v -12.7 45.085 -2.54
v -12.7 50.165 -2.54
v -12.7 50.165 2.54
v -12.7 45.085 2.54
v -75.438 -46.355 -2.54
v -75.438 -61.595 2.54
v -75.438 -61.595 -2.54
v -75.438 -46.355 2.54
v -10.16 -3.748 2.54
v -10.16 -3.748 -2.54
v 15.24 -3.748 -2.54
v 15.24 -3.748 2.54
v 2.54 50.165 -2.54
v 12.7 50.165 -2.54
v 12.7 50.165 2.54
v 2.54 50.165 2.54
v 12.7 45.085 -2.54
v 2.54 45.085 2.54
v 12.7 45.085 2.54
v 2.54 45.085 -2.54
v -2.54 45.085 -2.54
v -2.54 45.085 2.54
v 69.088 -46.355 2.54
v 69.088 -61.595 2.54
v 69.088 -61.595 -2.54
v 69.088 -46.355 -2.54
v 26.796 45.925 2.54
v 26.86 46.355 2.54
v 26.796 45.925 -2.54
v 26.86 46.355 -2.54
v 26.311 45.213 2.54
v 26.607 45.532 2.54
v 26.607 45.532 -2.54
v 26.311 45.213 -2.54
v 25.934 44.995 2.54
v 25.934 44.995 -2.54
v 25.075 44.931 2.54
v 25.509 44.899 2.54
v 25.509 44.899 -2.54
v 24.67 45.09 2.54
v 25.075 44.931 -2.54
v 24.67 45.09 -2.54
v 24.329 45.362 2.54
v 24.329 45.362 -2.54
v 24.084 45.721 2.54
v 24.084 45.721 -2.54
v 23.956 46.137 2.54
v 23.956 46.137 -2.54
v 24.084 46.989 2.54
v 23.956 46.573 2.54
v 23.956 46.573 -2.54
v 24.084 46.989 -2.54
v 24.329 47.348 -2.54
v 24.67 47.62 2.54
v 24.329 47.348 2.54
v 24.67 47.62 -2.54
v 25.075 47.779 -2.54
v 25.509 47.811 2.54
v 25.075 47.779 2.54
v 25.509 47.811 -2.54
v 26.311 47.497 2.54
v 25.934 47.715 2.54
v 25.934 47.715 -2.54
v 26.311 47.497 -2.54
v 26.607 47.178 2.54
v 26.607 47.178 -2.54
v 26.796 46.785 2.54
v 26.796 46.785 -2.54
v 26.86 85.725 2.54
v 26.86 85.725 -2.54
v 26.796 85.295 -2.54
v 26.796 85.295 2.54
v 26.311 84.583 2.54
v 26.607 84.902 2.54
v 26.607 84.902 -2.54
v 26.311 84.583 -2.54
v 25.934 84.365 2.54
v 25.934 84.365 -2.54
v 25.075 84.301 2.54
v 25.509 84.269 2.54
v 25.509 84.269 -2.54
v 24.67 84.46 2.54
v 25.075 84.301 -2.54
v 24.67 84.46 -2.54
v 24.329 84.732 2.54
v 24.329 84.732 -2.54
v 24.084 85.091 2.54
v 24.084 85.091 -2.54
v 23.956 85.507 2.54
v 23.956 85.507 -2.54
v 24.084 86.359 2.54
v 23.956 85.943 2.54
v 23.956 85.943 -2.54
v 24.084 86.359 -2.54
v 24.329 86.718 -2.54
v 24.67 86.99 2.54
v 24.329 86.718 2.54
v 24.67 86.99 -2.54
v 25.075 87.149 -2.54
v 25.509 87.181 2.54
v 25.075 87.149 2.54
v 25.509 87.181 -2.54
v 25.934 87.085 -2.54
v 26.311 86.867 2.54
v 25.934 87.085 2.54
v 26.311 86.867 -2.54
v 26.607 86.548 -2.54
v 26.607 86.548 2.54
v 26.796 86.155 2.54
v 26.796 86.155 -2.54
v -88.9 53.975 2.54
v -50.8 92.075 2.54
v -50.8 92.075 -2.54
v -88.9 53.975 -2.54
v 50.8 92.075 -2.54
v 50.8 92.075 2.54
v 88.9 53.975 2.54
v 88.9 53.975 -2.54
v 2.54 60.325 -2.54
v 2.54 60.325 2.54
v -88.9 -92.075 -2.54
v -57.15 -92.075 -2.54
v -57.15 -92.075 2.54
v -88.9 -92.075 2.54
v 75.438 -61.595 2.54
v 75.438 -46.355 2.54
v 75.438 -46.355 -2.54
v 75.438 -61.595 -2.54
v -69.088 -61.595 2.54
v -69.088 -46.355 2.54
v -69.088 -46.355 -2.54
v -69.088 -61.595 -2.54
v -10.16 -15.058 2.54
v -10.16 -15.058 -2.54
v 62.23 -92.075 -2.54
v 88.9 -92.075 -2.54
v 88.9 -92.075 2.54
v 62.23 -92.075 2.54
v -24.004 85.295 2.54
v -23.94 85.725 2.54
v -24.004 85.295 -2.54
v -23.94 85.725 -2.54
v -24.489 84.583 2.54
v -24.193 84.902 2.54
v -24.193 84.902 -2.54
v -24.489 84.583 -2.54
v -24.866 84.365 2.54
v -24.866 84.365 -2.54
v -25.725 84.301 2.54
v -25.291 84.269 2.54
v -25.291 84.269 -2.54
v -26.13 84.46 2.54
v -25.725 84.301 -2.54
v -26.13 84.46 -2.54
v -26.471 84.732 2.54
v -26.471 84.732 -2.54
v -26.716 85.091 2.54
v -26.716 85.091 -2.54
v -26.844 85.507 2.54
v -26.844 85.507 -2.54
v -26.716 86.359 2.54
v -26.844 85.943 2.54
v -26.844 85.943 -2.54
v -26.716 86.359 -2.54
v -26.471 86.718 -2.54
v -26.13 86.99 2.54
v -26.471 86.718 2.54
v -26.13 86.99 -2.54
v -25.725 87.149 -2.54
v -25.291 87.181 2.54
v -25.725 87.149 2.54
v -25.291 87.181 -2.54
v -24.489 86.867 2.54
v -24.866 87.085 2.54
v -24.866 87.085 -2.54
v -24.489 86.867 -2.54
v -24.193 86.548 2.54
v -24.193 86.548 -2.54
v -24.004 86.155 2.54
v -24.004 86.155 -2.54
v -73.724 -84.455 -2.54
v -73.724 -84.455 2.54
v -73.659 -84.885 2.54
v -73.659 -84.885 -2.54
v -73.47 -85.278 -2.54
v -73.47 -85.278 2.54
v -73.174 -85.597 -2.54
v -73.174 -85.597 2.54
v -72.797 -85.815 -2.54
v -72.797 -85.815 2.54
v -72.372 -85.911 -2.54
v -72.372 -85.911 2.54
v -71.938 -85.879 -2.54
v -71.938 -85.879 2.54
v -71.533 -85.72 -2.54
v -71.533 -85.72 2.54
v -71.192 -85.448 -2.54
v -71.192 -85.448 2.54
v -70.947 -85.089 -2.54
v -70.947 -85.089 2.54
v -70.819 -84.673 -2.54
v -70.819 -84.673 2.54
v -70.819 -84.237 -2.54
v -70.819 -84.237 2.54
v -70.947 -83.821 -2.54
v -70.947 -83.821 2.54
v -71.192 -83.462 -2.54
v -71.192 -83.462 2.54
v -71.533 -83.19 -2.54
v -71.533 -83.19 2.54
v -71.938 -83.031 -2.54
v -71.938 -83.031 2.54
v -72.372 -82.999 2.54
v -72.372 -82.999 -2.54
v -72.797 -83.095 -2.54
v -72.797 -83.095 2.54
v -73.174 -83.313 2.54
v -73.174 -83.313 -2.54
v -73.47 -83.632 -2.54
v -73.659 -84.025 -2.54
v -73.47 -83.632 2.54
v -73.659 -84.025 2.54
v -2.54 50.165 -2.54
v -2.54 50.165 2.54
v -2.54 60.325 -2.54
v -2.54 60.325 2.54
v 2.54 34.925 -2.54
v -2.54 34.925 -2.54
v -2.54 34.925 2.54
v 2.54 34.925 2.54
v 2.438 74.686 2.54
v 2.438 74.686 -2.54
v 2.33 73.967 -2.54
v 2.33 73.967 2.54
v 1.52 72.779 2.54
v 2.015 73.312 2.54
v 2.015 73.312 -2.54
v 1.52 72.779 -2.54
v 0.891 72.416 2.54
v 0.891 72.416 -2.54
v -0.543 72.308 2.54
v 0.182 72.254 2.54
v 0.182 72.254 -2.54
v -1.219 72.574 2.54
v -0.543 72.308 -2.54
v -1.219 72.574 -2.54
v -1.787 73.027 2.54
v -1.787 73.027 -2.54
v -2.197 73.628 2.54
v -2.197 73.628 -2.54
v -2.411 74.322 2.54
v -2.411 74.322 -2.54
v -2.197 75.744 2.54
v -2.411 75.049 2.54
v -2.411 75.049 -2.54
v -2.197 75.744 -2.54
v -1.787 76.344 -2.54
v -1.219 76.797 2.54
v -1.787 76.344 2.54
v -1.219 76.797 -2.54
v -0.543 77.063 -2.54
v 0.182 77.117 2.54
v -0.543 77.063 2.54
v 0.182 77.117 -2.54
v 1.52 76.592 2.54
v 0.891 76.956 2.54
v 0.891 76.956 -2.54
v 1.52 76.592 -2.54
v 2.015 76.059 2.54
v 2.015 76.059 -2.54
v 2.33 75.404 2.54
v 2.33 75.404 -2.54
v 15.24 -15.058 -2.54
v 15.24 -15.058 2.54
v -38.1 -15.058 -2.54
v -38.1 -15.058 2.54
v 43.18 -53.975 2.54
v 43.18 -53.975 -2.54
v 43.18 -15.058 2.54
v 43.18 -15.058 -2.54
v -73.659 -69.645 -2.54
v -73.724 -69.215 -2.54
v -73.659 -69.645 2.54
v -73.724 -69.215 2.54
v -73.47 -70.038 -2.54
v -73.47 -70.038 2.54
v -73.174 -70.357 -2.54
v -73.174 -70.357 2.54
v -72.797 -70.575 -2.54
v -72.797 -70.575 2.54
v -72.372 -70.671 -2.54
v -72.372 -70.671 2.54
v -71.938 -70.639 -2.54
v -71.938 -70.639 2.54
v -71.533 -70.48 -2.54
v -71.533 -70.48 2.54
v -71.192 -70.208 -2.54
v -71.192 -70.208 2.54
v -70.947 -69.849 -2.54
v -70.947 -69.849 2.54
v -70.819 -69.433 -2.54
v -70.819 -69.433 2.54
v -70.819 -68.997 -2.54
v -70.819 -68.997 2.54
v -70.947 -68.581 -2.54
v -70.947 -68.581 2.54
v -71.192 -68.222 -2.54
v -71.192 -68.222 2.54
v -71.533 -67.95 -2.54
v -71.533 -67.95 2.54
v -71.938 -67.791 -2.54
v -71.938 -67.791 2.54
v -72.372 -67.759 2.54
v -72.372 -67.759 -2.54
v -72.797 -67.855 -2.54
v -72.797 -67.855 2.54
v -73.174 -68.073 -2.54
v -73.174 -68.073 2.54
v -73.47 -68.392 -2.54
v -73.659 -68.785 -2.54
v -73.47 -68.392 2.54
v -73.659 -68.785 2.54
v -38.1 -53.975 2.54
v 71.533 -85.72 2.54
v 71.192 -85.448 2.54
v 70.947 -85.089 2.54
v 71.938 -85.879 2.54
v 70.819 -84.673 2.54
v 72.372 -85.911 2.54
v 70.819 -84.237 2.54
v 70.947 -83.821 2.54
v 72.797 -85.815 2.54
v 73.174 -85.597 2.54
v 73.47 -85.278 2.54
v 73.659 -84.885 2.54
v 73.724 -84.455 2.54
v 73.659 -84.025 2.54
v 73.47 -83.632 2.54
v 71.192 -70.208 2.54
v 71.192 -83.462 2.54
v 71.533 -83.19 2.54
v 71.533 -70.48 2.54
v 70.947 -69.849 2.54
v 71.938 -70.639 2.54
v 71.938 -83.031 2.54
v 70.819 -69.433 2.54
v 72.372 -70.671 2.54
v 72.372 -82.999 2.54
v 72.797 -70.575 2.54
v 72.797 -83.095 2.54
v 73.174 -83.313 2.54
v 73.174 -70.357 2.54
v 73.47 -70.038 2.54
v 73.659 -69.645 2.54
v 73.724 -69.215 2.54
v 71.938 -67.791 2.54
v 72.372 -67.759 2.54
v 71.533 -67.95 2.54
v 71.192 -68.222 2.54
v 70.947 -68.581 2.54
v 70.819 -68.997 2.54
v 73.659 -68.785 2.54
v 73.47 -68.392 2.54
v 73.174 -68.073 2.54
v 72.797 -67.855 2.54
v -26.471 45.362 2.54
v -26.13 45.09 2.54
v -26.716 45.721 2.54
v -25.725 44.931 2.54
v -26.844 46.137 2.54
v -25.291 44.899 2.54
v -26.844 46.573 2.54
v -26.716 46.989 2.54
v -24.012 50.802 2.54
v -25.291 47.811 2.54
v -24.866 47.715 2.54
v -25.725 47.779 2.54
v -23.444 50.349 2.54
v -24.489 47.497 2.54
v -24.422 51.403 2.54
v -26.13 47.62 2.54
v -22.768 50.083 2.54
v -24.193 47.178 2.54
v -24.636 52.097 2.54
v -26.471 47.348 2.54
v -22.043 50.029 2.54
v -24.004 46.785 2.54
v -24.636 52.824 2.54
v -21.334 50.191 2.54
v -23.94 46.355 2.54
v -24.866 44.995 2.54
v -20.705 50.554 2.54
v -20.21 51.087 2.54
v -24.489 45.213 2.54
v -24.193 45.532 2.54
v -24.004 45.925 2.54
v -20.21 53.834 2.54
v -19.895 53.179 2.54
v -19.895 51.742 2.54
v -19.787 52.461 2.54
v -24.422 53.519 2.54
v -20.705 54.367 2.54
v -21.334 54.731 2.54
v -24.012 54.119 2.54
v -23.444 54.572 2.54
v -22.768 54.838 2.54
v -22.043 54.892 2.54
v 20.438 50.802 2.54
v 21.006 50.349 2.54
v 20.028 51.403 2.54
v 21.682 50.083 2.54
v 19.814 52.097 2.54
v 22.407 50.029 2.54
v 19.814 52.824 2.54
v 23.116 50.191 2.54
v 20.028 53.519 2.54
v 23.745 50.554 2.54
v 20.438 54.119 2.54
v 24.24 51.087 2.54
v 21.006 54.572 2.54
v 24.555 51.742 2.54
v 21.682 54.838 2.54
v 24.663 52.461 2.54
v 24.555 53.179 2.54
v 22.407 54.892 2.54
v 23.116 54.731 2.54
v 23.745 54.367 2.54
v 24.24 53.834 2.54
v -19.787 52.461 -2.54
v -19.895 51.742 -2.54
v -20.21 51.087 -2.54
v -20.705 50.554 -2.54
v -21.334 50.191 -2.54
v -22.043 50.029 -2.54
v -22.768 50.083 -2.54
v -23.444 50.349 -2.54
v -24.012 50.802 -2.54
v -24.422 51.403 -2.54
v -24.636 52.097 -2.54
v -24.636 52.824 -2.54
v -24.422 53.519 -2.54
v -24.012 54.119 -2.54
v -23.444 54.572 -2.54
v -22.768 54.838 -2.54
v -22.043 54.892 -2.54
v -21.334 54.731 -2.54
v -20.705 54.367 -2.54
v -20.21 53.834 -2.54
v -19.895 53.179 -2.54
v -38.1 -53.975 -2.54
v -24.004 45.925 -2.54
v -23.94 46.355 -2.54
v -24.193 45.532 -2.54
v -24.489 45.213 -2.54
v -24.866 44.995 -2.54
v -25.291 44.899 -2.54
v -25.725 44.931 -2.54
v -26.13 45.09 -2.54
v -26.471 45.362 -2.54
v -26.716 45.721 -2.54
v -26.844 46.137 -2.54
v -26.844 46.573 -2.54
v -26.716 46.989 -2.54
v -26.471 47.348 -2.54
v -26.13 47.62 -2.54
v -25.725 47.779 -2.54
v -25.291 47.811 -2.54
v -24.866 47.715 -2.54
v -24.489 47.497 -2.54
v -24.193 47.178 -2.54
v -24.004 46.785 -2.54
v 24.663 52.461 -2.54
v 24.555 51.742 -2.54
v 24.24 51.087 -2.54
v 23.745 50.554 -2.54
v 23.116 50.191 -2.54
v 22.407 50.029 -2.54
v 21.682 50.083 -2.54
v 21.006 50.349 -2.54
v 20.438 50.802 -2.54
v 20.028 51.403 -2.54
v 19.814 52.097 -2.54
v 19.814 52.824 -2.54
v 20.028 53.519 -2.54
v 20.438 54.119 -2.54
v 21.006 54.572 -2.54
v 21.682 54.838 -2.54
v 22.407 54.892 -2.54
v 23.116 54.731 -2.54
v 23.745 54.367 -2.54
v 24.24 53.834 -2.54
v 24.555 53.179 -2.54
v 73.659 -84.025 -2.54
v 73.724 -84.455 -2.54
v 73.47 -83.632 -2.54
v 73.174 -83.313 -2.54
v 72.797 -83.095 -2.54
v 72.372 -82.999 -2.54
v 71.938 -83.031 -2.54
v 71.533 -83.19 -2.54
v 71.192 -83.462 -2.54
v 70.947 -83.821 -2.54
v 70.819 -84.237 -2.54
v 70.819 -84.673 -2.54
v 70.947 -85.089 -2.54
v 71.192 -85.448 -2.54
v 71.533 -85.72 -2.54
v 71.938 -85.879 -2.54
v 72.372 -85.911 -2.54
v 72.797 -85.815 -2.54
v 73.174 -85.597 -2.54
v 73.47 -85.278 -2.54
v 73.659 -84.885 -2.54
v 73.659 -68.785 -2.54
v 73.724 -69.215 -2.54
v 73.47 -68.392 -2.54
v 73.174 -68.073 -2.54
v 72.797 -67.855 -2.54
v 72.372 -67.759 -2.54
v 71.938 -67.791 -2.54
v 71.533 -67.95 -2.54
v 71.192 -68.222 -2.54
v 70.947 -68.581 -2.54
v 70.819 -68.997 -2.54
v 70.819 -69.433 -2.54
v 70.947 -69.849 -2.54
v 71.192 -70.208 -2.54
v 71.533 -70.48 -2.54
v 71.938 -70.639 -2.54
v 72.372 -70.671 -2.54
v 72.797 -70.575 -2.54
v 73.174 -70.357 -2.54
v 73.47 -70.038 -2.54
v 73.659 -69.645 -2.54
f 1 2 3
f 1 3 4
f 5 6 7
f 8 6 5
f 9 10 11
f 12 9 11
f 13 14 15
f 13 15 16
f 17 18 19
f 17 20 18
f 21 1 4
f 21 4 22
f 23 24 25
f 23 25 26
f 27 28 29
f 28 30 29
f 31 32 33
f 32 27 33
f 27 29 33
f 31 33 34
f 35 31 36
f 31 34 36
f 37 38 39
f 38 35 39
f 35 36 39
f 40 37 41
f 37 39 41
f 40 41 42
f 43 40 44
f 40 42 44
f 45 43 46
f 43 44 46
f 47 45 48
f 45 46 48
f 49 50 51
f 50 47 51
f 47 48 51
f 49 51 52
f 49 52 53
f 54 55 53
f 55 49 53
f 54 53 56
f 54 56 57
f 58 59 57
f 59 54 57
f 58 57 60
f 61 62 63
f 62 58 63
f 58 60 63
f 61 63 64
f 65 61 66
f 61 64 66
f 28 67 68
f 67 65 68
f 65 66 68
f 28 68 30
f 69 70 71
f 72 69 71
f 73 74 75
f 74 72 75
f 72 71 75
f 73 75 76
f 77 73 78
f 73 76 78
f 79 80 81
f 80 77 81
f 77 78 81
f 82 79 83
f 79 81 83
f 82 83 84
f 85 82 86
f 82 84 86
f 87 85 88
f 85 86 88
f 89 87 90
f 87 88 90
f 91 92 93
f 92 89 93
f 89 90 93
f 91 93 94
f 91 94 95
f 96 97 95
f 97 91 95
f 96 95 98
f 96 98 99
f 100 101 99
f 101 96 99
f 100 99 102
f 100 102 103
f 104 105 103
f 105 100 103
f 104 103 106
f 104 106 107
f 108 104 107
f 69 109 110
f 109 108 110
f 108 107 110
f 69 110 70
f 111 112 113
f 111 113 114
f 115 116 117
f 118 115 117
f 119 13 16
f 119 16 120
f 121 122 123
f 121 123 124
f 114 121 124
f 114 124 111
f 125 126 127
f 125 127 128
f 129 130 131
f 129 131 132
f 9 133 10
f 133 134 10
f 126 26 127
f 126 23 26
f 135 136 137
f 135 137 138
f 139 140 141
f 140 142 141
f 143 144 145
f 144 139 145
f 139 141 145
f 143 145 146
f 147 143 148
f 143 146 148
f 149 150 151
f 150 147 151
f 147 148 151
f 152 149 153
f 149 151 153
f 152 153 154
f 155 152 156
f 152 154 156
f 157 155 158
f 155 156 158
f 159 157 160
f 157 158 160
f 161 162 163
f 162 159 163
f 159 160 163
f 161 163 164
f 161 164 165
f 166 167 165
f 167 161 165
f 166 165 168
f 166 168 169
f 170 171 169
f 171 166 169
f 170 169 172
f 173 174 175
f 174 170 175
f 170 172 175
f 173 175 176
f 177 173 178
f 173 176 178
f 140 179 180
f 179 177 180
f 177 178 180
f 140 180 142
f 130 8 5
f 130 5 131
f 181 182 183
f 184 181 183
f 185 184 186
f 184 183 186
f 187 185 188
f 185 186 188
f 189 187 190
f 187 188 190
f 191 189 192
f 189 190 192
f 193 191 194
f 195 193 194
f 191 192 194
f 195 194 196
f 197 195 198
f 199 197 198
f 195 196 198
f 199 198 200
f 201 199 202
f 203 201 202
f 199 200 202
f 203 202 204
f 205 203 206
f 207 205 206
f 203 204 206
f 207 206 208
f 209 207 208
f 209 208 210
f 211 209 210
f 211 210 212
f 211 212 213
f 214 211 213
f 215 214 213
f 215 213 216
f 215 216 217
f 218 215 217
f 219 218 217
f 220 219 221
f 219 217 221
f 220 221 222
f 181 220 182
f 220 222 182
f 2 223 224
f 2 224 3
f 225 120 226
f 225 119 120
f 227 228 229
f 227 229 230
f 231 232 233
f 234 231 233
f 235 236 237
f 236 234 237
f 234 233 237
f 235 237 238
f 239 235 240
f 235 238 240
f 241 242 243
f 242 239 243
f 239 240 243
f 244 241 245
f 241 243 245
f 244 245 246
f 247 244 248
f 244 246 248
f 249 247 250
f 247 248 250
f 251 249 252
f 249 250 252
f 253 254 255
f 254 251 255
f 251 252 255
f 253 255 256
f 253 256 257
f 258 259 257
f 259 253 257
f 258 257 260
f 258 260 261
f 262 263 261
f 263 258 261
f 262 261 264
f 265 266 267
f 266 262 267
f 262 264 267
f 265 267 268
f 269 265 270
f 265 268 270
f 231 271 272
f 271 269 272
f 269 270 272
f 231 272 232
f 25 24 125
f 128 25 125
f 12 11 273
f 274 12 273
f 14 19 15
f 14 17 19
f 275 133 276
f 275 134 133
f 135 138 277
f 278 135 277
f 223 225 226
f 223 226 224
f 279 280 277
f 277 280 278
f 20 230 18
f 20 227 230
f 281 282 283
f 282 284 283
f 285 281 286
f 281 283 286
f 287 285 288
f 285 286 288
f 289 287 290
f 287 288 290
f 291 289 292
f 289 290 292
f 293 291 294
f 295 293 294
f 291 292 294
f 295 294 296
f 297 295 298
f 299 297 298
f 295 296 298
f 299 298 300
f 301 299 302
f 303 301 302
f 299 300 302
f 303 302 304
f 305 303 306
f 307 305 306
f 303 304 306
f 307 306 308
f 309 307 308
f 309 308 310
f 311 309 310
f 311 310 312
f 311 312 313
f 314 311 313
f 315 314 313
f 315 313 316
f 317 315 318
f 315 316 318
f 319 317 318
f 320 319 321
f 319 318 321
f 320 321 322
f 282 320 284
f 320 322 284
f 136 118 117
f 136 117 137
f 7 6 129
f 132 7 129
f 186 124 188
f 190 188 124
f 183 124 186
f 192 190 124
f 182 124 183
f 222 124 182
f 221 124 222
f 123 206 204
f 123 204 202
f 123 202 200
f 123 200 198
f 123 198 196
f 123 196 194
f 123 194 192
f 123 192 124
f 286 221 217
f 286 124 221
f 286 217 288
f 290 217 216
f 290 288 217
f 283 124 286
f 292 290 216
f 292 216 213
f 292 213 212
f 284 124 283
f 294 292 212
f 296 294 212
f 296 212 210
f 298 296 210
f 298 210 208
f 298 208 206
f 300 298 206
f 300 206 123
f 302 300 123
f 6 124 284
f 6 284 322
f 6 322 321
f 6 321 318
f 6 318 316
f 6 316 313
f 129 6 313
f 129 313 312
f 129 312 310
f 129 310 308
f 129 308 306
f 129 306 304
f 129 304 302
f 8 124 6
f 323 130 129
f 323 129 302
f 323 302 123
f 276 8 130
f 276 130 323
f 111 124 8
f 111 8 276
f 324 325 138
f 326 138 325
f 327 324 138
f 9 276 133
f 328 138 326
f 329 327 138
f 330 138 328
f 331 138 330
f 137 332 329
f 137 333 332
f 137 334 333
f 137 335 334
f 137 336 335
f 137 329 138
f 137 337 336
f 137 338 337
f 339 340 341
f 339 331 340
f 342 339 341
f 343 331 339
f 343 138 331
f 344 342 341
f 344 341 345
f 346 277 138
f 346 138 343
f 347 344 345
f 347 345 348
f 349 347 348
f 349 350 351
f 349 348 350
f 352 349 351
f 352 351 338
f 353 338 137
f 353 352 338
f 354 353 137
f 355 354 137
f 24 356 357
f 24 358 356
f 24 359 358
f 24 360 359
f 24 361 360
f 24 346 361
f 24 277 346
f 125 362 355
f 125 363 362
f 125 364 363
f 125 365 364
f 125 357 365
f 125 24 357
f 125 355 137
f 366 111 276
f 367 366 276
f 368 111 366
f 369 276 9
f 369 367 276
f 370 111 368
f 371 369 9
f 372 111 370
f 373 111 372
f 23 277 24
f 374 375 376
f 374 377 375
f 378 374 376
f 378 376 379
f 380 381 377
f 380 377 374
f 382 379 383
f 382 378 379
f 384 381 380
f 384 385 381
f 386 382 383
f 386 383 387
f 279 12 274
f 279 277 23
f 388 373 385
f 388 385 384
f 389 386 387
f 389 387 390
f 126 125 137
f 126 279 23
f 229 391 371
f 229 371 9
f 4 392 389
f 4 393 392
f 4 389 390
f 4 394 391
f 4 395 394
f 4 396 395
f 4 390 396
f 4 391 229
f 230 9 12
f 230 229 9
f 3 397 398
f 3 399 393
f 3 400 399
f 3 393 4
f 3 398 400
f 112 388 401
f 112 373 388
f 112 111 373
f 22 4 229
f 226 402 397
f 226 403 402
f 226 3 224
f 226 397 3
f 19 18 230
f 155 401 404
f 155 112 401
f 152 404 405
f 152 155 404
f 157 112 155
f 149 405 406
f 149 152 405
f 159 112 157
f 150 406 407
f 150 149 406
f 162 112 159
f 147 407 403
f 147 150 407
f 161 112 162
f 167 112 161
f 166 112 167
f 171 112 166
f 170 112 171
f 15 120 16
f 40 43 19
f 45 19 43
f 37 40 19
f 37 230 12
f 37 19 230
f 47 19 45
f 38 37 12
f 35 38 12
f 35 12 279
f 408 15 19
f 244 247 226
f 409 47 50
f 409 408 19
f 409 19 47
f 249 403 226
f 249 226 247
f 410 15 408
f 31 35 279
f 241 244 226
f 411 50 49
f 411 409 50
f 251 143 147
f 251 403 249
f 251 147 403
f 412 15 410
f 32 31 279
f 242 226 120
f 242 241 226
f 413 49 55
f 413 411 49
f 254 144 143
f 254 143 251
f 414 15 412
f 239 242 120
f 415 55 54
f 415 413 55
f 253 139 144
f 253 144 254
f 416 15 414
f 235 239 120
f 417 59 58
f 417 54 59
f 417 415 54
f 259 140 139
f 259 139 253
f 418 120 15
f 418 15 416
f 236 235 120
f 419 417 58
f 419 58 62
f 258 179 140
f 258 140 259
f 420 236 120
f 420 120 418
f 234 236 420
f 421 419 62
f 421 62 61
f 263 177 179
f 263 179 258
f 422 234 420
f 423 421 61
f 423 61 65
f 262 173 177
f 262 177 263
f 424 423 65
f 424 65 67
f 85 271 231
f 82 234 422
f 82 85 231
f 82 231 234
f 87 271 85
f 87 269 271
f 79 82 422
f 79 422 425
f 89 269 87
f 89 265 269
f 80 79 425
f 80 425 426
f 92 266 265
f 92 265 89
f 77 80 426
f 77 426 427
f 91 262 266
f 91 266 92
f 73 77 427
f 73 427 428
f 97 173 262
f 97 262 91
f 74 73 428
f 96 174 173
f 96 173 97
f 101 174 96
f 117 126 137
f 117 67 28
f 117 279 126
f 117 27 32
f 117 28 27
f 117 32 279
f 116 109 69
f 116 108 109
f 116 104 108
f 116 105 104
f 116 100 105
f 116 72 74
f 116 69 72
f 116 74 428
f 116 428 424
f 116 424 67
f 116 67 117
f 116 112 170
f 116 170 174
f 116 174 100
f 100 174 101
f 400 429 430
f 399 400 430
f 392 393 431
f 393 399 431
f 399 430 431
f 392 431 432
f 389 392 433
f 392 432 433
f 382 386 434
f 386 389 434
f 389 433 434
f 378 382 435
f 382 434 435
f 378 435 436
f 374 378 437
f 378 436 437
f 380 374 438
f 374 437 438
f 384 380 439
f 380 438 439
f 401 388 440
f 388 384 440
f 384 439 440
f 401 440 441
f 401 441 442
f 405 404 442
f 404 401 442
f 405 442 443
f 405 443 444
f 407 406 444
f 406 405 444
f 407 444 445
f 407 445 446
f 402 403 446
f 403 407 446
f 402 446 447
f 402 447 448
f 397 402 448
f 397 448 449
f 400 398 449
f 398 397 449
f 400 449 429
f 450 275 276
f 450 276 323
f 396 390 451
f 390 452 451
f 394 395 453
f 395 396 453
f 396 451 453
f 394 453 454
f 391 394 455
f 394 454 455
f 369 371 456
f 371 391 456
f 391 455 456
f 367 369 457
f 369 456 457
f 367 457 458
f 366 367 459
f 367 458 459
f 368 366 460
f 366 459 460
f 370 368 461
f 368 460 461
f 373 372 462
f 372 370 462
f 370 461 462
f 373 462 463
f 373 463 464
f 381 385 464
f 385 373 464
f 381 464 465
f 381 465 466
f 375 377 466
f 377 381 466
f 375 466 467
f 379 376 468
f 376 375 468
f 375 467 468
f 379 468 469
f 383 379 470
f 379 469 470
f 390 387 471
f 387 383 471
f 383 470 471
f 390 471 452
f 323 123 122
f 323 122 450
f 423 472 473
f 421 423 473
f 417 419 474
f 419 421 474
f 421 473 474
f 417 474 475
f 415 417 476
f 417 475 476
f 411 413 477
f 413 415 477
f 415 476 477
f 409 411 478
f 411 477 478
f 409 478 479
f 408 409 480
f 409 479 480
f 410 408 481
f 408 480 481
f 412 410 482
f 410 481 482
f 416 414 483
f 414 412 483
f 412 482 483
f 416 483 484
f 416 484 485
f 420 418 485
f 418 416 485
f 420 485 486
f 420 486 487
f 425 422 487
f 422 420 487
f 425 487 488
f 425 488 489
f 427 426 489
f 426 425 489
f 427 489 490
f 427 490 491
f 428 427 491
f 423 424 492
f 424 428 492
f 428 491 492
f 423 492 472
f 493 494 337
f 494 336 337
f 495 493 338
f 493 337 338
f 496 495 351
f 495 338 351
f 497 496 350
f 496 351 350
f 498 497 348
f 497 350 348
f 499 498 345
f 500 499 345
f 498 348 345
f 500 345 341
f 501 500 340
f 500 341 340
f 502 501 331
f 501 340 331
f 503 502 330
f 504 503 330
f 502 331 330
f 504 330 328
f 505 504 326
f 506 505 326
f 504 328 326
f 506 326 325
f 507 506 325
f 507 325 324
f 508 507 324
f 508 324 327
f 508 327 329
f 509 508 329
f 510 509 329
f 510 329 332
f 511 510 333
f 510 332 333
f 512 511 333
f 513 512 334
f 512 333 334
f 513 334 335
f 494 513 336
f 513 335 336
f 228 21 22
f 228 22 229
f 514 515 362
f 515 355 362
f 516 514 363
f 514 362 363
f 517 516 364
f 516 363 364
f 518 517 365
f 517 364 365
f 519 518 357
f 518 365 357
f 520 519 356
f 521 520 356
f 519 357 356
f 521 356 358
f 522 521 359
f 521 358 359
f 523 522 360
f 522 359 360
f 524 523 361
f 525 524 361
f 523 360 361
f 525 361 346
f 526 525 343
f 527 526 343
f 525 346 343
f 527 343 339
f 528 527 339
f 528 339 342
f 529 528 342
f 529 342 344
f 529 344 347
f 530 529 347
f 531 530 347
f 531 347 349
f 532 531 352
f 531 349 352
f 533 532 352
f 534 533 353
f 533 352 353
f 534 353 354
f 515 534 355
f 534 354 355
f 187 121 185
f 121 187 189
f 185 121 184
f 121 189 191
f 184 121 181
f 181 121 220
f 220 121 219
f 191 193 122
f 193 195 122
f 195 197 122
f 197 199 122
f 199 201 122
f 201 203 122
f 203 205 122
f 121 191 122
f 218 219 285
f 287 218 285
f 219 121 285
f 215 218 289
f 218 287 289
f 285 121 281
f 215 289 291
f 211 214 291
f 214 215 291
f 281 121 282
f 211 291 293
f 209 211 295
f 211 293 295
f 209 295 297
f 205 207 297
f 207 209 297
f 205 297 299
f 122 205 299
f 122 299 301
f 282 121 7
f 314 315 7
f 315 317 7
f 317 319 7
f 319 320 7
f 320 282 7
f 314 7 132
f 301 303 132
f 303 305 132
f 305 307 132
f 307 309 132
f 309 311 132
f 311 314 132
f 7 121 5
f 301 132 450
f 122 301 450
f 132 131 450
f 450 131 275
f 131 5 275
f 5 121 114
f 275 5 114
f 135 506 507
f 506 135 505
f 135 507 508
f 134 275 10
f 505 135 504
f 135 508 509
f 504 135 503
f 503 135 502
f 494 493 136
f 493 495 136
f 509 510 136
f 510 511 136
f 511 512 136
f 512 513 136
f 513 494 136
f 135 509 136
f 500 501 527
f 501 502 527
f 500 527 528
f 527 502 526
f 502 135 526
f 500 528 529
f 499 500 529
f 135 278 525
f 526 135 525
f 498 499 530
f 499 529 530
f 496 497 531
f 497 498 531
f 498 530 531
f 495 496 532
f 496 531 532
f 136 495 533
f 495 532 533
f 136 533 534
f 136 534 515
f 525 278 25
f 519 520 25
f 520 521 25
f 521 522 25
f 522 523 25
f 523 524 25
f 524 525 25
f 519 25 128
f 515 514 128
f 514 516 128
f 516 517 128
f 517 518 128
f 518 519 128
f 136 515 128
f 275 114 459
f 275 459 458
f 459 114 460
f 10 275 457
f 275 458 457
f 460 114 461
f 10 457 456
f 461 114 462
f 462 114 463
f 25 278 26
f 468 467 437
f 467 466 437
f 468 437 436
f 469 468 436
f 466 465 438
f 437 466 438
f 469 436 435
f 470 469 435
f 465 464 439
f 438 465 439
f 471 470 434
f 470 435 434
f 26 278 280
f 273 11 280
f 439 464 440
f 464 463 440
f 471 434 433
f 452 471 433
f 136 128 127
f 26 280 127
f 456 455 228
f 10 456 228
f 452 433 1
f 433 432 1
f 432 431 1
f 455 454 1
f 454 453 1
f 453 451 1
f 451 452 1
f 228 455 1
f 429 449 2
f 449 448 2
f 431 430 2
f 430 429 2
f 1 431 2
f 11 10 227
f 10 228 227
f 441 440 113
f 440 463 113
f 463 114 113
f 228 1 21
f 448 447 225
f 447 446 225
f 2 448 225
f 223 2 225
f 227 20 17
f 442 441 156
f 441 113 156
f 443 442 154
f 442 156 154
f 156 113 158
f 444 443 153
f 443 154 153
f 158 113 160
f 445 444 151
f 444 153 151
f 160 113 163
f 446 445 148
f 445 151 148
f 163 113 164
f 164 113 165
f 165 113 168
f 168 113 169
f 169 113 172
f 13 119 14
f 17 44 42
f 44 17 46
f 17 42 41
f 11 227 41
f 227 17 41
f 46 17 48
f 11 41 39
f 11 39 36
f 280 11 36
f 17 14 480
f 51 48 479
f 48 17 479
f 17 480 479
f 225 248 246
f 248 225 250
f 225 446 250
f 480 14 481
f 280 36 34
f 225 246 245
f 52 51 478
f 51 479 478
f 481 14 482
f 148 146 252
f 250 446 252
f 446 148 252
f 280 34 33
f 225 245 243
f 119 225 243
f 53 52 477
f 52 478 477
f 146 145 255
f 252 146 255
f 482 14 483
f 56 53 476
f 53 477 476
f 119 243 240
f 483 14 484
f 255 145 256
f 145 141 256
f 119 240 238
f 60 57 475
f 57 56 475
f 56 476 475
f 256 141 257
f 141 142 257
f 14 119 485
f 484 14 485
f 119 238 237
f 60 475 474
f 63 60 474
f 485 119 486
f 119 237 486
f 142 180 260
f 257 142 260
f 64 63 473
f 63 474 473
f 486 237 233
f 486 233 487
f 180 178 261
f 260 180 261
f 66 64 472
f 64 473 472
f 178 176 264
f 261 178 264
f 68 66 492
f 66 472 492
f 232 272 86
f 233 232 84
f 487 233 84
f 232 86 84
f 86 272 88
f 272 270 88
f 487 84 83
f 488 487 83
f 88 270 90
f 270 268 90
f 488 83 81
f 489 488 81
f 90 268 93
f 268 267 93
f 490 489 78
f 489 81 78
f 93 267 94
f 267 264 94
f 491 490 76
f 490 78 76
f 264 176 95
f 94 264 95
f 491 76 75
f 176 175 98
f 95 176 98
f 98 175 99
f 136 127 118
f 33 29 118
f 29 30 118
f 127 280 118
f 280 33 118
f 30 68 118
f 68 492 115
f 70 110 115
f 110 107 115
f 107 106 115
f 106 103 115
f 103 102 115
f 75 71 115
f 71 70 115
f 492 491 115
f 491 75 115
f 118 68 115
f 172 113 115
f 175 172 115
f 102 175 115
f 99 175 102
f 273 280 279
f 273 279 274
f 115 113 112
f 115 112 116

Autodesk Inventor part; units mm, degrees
ref_plane "YZ Plane" through (0, 0, 0) normal (1, 0, 0) x (0, 1, 0)
ref_plane "XZ Plane" through (0, 0, 0) normal (0, 1, 0) x (-1, 0, 0)
ref_plane "XY Plane" through (0, 0, 0) normal (0, 0, 1) x (1, 0, 0)
sketch "Sketch1" plane through (0, 0, 0) normal (0, 0, 1) x (1, 0, 0)
  line L0 (-88.9, -92.075) -> (-88.9, 92.075)
  line L1 (-88.9, 92.075) -> (88.9, 92.075)
  line L2 (88.9, 92.075) -> (88.9, -92.075)
  line L3 (88.9, -92.075) -> (-88.9, -92.075)
  line L4 (-88.9, -92.075) -> (88.9, 92.075) construction
  line L5 (-88.9, 92.075) -> (88.9, -92.075) construction
  line L6 (-2.54, 53.34) -> (2.54, 53.34) construction
  line L7 (2.54, 78.74) -> (-2.54, 78.74) construction
  line L8 (-12.7, 63.5) -> (-12.7, 68.58) construction
  line L9 (12.7, 68.58) -> (12.7, 63.5) construction
  line L10 (-2.54, 63.5) -> (-12.7, 63.5) construction
  line L11 (-2.54, 63.5) -> (-2.54, 53.34) construction
  line L12 (-2.54, 78.74) -> (-2.54, 68.58) construction
  line L13 (-12.7, 68.58) -> (-2.54, 68.58) construction
  line L14 (2.54, 68.58) -> (12.7, 68.58) construction
  line L15 (12.7, 63.5) -> (2.54, 63.5) construction
  line L16 (2.54, 53.34) -> (2.54, 63.5) construction
  line L17 (2.54, 68.58) -> (2.54, 78.74) construction
  circle A0 centre (25.4, 85.725) radius 1.4605
  line L18 (12.7, 66.04) -> (-12.7, 66.04) construction
  line L19 (0, 53.34) -> (0, 78.74) construction
  circle A1 centre (25.4, 46.355) radius 1.4605
  circle A2 centre (-25.4, 85.725) radius 1.4605
  circle A3 centre (-25.4, 46.355) radius 1.4605
  line L20 (12.7, 50.165) -> (-12.7, 50.165)
  line L21 (-12.7, 50.165) -> (-12.7, 45.085)
  line L22 (-12.7, 45.085) -> (12.7, 45.085)
  line L23 (12.7, 45.085) -> (12.7, 50.165)
  line L24 (12.7, 50.165) -> (-12.7, 45.085) construction
  line L25 (-12.7, 50.165) -> (12.7, 45.085) construction
  line L26 (2.54, 60.325) -> (-2.54, 60.325)
  line L27 (-2.54, 60.325) -> (-2.54, 34.925)
  line L28 (-2.54, 34.925) -> (2.54, 34.925)
  line L29 (2.54, 34.925) -> (2.54, 60.325)
  line L30 (2.54, 60.325) -> (-2.54, 34.925) construction
  line L31 (-2.54, 60.325) -> (2.54, 34.925) construction
  circle A4 centre (22.225, 52.4607) radius 2.4384 projected
  circle A5 centre (0, 74.6857) radius 2.4384 projected
  circle A6 centre (-22.225, 52.4607) radius 2.4384 projected
  line L32 (7.62, -36.5282) -> (12.7, -36.5282) projected
  line L33 (12.7, -36.5282) -> (12.7, -11.1282) projected
  line L34 (12.7, -11.1282) -> (12.7, -6.2879) projected
  line L35 (7.62, -6.2879) -> (12.7, -6.2879) projected
  line L36 (2.54, -6.2879) -> (7.62, -6.2879) projected
  line L37 (-2.54, -6.2879) -> (2.54, -6.2879) projected
  line L38 (-7.62, -6.2879) -> (-2.54, -6.2879) projected
  line L39 (-7.62, -11.1282) -> (-7.62, -6.2879) projected
  line L40 (-7.62, -36.5282) -> (-7.62, -11.1282) projected
  line L41 (-2.54, -36.5282) -> (2.54, -36.5282) projected
  line L42 (-7.62, -36.5282) -> (-2.54, -36.5282) projected
  line L43 (2.54, -36.5282) -> (7.62, -36.5282) projected
  line L44 (15.24, -3.7479) -> (15.24, -11.1282)
  line L45 (15.24, -11.1282) -> (15.24, -39.0682)
  line L46 (15.24, -39.0682) -> (7.62, -39.0682)
  line L47 (7.62, -39.0682) -> (2.54, -39.0682)
  line L48 (2.54, -39.0682) -> (-2.54, -39.0682)
  line L49 (-2.54, -39.0682) -> (-10.16, -39.0682)
  line L50 (-10.16, -39.0682) -> (-10.16, -11.1282)
  line L51 (-10.16, -11.1282) -> (-10.16, -3.7479)
  line L52 (-10.16, -3.7479) -> (-2.54, -3.7479)
  line L53 (-2.54, -3.7479) -> (2.54, -3.7479)
  line L54 (2.54, -3.7479) -> (7.62, -3.7479)
  line L55 (7.62, -3.7479) -> (15.24, -3.7479)
  line L56 (-38.1, -27.758) -> (43.18, -27.758)
  line L57 (43.18, -27.758) -> (43.18, -15.058)
  line L58 (43.18, -15.058) -> (-38.1, -15.058)
  line L59 (-38.1, -15.058) -> (-38.1, -27.758)
  line L60 (-38.1, -27.758) -> (43.18, -15.058) construction
  line L61 (43.18, -27.758) -> (-38.1, -15.058) construction
  line L62 (-38.1, -27.758) -> (-38.1, -92.075)
  line L63 (43.18, -27.758) -> (43.18, -92.075)
  point P0 (0, 0)
  point P1 (0, 47.625)
  point P2 (2.54, 50.165)
  point P3 (2.54, 45.085)
  point P4 (-2.54, 45.085)
  point P5 (-2.54, 50.165)
  point P6 (2.54, -21.408)
  point P7 (2.54, -21.408)
  point P8 (-10.16, -27.758)
  point P9 (-10.16, -15.058)
  point P10 (15.24, -15.058)
  point P11 (15.24, -27.758)
  dimension "d0" = 184.15
  dimension "d1" = 177.8
  dimension "d26" = 5.08
  dimension "d27" = 5.08
  dimension "d28" = 6.35
  dimension "d29" = 2.921
  dimension "d30" = 63.5
  dimension "d31" = 25.4
  dimension "d32" = 25.4
  dimension "d33" = 25.4
  dimension "d34" = 5.08
  dimension "d35" = 5.08
  dimension "d36" = 44.45
  dimension "d37" = 88.9
  dimension "d40" = 2.54
  dimension "d41" = 81.28
  dimension "d42" = 12.7
  dimension "d43" = 30.2403
  dimension "d44" = 15.1201
extrude "Extrusion1" add sketch "Sketch1" along normal mid plane 5.08 contours L0 L1 L2 L3 L63 L57 L58 L45 L44 L55 L54 L53 L52 L51 L50 L59 L62
sketch "Sketch2" plane through (0, 0, 2.54) normal (0, 0, 1) x (1, 0, 0)
  circle A0 centre (-22.86, -3.175) radius 1.4605 construction
  circle A1 centre (-12.7, -3.175) radius 1.4605 construction
  line L0 (0, -6.35) -> (0, 0) construction
  line L1 (-25.4, 0) -> (0, 0) construction
  line L2 (-25.4, 0) -> (-25.4, -6.35) construction
  line L3 (0, -6.35) -> (-25.4, -6.35) construction
  line L4 (15.24, -6.35) -> (15.24, 0) construction
  line L5 (0, 0) -> (15.24, 0) construction
  line L6 (0, -6.35) -> (0, 0) construction
  line L7 (15.24, -6.35) -> (0, -6.35) construction
  line L8 (69.088, -61.595) -> (69.088, -46.355)
  line L9 (69.088, -46.355) -> (75.438, -46.355)
  line L10 (75.438, -46.355) -> (75.438, -61.595)
  line L11 (75.438, -86.995) -> (69.088, -86.995) construction
  line L12 (88.9, -92.075) -> (88.9, 92.075) projected
  line L13 (-88.9, -92.075) -> (88.9, -92.075) projected
  line L14 (69.088, -61.595) -> (75.438, -61.595)
  circle A2 centre (72.263, -84.455) radius 1.4605
  circle A3 centre (72.263, -69.215) radius 1.4605
  point P0 (-25.4, -3.175)
  dimension "d14" = 13.462
  dimension "d15" = 6.35
  dimension "d16" = 5.08
  dimension "d17" = 40.64
  dimension "d18" = 15.24
  dimension "d19" = 2.921
  dimension "d20" = 2.921
  dimension "d21" = 15.24
  dimension "d22" = 3.175
  dimension "d23" = 2.54
extrude "Extrusion2" cut sketch "Sketch2" against normal through all
mirror "Mirror1" about plane through (0, 0, 0) normal (1, 0, 0) of "Extrusion2"
sketch "Sketch7" plane through (0, 0, 2.54) normal (0, 0, 1) x (1, 0, 0)
  circle A0 centre (-72.263, -84.455) radius 1.4605 projected
  line L0 (-69.088, -61.595) -> (-75.438, -61.595) projected
  line L1 (-75.438, -61.595) -> (-75.438, -46.355) projected
  line L2 (-75.438, -46.355) -> (-69.088, -46.355) projected
  line L3 (-69.088, -46.355) -> (-69.088, -61.595) projected
  circle A1 centre (-72.263, -69.215) radius 1.4605 projected
  circle A2 centre (72.263, -84.455) radius 1.4605 projected
  circle A3 centre (72.263, -69.215) radius 1.4605 projected
  line L4 (69.088, -46.355) -> (75.438, -46.355) projected
  line L5 (75.438, -46.355) -> (75.438, -61.595) projected
  line L6 (75.438, -61.595) -> (69.088, -61.595) projected
  line L7 (69.088, -61.595) -> (69.088, -46.355) projected
  line L8 (15.24, -3.7479) -> (15.24, -15.058) projected
  line L9 (15.24, -15.058) -> (43.18, -15.058) projected
  line L10 (43.18, -15.058) -> (43.18, -92.075) projected
  line L11 (-10.16, -15.058) -> (-10.16, -3.7479) projected
  line L12 (-38.1, -92.075) -> (-38.1, -15.058) projected
  line L13 (-38.1, -15.058) -> (-10.16, -15.058) projected
  line L14 (-10.16, -3.7479) -> (15.24, -3.7479) projected
  circle A4 centre (-22.225, 52.4607) radius 2.4384 projected
  circle A5 centre (0, 74.6857) radius 2.4384 projected
  circle A6 centre (22.225, 52.4607) radius 2.4384 projected
  circle A7 centre (25.4, 85.725) radius 1.4605 projected
  circle A8 centre (25.4, 46.355) radius 1.4605 projected
  circle A9 centre (-25.4, 85.725) radius 1.4605 projected
  circle A10 centre (-25.4, 46.355) radius 1.4605 projected
  line L15 (-12.7, 45.085) -> (-12.7, 50.165) projected
  line L16 (-12.7, 50.165) -> (-2.54, 50.165) projected
  line L17 (-2.54, 50.165) -> (-2.54, 60.325) projected
  line L18 (-2.54, 60.325) -> (2.54, 60.325) projected
  line L19 (2.54, 60.325) -> (2.54, 50.165) projected
  line L20 (2.54, 50.165) -> (12.7, 50.165) projected
  line L21 (12.7, 50.165) -> (12.7, 45.085) projected
  line L22 (12.7, 45.085) -> (2.54, 45.085) projected
  line L23 (2.54, 45.085) -> (2.54, 34.925) projected
  line L24 (2.54, 34.925) -> (-2.54, 34.925) projected
  line L25 (-2.54, 34.925) -> (-2.54, 45.085) projected
  line L26 (-2.54, 45.085) -> (-12.7, 45.085) projected
  line L27 (-88.9, -92.075) -> (-38.1, -92.075) projected
  line L28 (88.9, -92.075) -> (88.9, 92.075) projected
  line L29 (88.9, 92.075) -> (-88.9, 92.075) projected
  line L30 (-88.9, 92.075) -> (-88.9, -92.075) projected
  line L31 (43.18, -92.075) -> (88.9, -92.075) projected
  point P0 (0, 0)
sketch "Sketch8" plane through (0, 0, 2.54) normal (0, 0, 1) x (1, 0, 0)
  line L0 (-57.15, -92.075) -> (-38.1, -53.975)
  line L1 (0, 0) -> (0, -92.075) construction
  line L2 (-88.9, -92.075) -> (-38.1, -92.075) projected
  line L3 (-38.1, -92.075) -> (-38.1, -15.058) projected
  line L4 (-57.15, -92.075) -> (-38.1, -92.075)
  line L5 (43.18, -15.058) -> (43.18, -92.075) projected
  line L6 (43.18, -92.075) -> (62.23, -92.075)
  line L7 (43.18, -92.075) -> (88.9, -92.075) projected
  line L8 (62.23, -92.075) -> (43.18, -53.975)
  line L9 (43.18, -53.975) -> (43.18, -92.075)
  dimension "d45" = 19.05
  dimension "d46" = 38.1
  dimension "d47" = 19.05
  dimension "d48" = 38.1
extrude "Extrusion3" cut sketch "Sketch8" against normal blind 25.4
sketch "Sketch9" plane through (0, 0, 2.54) normal (0, 0, 1) x (1, 0, 0)
  line L0 (-88.9, 92.075) -> (88.9, 92.075) projected
  line L1 (50.8, 92.075) -> (88.9, 53.975)
  line L2 (88.9, 53.975) -> (88.9, 92.075)
  line L3 (88.9, 92.075) -> (50.8, 92.075)
  line L4 (-88.9, -92.075) -> (-88.9, 92.075) projected
  line L5 (-88.9, 92.075) -> (-88.9, 53.975)
  line L6 (-50.8, 92.075) -> (-88.9, 53.975)
  line L7 (-88.9, 92.075) -> (-50.8, 92.075)
  point P0 (0, 0)
  dimension "d51" = 38.1
  dimension "d52" = 38.1
  dimension "d53" = 38.1
extrude "Extrusion4" cut sketch "Sketch9" against normal blind 25.4
equation "\"d44\" = 0.5 * d43"
properties part number "BoardProj"
